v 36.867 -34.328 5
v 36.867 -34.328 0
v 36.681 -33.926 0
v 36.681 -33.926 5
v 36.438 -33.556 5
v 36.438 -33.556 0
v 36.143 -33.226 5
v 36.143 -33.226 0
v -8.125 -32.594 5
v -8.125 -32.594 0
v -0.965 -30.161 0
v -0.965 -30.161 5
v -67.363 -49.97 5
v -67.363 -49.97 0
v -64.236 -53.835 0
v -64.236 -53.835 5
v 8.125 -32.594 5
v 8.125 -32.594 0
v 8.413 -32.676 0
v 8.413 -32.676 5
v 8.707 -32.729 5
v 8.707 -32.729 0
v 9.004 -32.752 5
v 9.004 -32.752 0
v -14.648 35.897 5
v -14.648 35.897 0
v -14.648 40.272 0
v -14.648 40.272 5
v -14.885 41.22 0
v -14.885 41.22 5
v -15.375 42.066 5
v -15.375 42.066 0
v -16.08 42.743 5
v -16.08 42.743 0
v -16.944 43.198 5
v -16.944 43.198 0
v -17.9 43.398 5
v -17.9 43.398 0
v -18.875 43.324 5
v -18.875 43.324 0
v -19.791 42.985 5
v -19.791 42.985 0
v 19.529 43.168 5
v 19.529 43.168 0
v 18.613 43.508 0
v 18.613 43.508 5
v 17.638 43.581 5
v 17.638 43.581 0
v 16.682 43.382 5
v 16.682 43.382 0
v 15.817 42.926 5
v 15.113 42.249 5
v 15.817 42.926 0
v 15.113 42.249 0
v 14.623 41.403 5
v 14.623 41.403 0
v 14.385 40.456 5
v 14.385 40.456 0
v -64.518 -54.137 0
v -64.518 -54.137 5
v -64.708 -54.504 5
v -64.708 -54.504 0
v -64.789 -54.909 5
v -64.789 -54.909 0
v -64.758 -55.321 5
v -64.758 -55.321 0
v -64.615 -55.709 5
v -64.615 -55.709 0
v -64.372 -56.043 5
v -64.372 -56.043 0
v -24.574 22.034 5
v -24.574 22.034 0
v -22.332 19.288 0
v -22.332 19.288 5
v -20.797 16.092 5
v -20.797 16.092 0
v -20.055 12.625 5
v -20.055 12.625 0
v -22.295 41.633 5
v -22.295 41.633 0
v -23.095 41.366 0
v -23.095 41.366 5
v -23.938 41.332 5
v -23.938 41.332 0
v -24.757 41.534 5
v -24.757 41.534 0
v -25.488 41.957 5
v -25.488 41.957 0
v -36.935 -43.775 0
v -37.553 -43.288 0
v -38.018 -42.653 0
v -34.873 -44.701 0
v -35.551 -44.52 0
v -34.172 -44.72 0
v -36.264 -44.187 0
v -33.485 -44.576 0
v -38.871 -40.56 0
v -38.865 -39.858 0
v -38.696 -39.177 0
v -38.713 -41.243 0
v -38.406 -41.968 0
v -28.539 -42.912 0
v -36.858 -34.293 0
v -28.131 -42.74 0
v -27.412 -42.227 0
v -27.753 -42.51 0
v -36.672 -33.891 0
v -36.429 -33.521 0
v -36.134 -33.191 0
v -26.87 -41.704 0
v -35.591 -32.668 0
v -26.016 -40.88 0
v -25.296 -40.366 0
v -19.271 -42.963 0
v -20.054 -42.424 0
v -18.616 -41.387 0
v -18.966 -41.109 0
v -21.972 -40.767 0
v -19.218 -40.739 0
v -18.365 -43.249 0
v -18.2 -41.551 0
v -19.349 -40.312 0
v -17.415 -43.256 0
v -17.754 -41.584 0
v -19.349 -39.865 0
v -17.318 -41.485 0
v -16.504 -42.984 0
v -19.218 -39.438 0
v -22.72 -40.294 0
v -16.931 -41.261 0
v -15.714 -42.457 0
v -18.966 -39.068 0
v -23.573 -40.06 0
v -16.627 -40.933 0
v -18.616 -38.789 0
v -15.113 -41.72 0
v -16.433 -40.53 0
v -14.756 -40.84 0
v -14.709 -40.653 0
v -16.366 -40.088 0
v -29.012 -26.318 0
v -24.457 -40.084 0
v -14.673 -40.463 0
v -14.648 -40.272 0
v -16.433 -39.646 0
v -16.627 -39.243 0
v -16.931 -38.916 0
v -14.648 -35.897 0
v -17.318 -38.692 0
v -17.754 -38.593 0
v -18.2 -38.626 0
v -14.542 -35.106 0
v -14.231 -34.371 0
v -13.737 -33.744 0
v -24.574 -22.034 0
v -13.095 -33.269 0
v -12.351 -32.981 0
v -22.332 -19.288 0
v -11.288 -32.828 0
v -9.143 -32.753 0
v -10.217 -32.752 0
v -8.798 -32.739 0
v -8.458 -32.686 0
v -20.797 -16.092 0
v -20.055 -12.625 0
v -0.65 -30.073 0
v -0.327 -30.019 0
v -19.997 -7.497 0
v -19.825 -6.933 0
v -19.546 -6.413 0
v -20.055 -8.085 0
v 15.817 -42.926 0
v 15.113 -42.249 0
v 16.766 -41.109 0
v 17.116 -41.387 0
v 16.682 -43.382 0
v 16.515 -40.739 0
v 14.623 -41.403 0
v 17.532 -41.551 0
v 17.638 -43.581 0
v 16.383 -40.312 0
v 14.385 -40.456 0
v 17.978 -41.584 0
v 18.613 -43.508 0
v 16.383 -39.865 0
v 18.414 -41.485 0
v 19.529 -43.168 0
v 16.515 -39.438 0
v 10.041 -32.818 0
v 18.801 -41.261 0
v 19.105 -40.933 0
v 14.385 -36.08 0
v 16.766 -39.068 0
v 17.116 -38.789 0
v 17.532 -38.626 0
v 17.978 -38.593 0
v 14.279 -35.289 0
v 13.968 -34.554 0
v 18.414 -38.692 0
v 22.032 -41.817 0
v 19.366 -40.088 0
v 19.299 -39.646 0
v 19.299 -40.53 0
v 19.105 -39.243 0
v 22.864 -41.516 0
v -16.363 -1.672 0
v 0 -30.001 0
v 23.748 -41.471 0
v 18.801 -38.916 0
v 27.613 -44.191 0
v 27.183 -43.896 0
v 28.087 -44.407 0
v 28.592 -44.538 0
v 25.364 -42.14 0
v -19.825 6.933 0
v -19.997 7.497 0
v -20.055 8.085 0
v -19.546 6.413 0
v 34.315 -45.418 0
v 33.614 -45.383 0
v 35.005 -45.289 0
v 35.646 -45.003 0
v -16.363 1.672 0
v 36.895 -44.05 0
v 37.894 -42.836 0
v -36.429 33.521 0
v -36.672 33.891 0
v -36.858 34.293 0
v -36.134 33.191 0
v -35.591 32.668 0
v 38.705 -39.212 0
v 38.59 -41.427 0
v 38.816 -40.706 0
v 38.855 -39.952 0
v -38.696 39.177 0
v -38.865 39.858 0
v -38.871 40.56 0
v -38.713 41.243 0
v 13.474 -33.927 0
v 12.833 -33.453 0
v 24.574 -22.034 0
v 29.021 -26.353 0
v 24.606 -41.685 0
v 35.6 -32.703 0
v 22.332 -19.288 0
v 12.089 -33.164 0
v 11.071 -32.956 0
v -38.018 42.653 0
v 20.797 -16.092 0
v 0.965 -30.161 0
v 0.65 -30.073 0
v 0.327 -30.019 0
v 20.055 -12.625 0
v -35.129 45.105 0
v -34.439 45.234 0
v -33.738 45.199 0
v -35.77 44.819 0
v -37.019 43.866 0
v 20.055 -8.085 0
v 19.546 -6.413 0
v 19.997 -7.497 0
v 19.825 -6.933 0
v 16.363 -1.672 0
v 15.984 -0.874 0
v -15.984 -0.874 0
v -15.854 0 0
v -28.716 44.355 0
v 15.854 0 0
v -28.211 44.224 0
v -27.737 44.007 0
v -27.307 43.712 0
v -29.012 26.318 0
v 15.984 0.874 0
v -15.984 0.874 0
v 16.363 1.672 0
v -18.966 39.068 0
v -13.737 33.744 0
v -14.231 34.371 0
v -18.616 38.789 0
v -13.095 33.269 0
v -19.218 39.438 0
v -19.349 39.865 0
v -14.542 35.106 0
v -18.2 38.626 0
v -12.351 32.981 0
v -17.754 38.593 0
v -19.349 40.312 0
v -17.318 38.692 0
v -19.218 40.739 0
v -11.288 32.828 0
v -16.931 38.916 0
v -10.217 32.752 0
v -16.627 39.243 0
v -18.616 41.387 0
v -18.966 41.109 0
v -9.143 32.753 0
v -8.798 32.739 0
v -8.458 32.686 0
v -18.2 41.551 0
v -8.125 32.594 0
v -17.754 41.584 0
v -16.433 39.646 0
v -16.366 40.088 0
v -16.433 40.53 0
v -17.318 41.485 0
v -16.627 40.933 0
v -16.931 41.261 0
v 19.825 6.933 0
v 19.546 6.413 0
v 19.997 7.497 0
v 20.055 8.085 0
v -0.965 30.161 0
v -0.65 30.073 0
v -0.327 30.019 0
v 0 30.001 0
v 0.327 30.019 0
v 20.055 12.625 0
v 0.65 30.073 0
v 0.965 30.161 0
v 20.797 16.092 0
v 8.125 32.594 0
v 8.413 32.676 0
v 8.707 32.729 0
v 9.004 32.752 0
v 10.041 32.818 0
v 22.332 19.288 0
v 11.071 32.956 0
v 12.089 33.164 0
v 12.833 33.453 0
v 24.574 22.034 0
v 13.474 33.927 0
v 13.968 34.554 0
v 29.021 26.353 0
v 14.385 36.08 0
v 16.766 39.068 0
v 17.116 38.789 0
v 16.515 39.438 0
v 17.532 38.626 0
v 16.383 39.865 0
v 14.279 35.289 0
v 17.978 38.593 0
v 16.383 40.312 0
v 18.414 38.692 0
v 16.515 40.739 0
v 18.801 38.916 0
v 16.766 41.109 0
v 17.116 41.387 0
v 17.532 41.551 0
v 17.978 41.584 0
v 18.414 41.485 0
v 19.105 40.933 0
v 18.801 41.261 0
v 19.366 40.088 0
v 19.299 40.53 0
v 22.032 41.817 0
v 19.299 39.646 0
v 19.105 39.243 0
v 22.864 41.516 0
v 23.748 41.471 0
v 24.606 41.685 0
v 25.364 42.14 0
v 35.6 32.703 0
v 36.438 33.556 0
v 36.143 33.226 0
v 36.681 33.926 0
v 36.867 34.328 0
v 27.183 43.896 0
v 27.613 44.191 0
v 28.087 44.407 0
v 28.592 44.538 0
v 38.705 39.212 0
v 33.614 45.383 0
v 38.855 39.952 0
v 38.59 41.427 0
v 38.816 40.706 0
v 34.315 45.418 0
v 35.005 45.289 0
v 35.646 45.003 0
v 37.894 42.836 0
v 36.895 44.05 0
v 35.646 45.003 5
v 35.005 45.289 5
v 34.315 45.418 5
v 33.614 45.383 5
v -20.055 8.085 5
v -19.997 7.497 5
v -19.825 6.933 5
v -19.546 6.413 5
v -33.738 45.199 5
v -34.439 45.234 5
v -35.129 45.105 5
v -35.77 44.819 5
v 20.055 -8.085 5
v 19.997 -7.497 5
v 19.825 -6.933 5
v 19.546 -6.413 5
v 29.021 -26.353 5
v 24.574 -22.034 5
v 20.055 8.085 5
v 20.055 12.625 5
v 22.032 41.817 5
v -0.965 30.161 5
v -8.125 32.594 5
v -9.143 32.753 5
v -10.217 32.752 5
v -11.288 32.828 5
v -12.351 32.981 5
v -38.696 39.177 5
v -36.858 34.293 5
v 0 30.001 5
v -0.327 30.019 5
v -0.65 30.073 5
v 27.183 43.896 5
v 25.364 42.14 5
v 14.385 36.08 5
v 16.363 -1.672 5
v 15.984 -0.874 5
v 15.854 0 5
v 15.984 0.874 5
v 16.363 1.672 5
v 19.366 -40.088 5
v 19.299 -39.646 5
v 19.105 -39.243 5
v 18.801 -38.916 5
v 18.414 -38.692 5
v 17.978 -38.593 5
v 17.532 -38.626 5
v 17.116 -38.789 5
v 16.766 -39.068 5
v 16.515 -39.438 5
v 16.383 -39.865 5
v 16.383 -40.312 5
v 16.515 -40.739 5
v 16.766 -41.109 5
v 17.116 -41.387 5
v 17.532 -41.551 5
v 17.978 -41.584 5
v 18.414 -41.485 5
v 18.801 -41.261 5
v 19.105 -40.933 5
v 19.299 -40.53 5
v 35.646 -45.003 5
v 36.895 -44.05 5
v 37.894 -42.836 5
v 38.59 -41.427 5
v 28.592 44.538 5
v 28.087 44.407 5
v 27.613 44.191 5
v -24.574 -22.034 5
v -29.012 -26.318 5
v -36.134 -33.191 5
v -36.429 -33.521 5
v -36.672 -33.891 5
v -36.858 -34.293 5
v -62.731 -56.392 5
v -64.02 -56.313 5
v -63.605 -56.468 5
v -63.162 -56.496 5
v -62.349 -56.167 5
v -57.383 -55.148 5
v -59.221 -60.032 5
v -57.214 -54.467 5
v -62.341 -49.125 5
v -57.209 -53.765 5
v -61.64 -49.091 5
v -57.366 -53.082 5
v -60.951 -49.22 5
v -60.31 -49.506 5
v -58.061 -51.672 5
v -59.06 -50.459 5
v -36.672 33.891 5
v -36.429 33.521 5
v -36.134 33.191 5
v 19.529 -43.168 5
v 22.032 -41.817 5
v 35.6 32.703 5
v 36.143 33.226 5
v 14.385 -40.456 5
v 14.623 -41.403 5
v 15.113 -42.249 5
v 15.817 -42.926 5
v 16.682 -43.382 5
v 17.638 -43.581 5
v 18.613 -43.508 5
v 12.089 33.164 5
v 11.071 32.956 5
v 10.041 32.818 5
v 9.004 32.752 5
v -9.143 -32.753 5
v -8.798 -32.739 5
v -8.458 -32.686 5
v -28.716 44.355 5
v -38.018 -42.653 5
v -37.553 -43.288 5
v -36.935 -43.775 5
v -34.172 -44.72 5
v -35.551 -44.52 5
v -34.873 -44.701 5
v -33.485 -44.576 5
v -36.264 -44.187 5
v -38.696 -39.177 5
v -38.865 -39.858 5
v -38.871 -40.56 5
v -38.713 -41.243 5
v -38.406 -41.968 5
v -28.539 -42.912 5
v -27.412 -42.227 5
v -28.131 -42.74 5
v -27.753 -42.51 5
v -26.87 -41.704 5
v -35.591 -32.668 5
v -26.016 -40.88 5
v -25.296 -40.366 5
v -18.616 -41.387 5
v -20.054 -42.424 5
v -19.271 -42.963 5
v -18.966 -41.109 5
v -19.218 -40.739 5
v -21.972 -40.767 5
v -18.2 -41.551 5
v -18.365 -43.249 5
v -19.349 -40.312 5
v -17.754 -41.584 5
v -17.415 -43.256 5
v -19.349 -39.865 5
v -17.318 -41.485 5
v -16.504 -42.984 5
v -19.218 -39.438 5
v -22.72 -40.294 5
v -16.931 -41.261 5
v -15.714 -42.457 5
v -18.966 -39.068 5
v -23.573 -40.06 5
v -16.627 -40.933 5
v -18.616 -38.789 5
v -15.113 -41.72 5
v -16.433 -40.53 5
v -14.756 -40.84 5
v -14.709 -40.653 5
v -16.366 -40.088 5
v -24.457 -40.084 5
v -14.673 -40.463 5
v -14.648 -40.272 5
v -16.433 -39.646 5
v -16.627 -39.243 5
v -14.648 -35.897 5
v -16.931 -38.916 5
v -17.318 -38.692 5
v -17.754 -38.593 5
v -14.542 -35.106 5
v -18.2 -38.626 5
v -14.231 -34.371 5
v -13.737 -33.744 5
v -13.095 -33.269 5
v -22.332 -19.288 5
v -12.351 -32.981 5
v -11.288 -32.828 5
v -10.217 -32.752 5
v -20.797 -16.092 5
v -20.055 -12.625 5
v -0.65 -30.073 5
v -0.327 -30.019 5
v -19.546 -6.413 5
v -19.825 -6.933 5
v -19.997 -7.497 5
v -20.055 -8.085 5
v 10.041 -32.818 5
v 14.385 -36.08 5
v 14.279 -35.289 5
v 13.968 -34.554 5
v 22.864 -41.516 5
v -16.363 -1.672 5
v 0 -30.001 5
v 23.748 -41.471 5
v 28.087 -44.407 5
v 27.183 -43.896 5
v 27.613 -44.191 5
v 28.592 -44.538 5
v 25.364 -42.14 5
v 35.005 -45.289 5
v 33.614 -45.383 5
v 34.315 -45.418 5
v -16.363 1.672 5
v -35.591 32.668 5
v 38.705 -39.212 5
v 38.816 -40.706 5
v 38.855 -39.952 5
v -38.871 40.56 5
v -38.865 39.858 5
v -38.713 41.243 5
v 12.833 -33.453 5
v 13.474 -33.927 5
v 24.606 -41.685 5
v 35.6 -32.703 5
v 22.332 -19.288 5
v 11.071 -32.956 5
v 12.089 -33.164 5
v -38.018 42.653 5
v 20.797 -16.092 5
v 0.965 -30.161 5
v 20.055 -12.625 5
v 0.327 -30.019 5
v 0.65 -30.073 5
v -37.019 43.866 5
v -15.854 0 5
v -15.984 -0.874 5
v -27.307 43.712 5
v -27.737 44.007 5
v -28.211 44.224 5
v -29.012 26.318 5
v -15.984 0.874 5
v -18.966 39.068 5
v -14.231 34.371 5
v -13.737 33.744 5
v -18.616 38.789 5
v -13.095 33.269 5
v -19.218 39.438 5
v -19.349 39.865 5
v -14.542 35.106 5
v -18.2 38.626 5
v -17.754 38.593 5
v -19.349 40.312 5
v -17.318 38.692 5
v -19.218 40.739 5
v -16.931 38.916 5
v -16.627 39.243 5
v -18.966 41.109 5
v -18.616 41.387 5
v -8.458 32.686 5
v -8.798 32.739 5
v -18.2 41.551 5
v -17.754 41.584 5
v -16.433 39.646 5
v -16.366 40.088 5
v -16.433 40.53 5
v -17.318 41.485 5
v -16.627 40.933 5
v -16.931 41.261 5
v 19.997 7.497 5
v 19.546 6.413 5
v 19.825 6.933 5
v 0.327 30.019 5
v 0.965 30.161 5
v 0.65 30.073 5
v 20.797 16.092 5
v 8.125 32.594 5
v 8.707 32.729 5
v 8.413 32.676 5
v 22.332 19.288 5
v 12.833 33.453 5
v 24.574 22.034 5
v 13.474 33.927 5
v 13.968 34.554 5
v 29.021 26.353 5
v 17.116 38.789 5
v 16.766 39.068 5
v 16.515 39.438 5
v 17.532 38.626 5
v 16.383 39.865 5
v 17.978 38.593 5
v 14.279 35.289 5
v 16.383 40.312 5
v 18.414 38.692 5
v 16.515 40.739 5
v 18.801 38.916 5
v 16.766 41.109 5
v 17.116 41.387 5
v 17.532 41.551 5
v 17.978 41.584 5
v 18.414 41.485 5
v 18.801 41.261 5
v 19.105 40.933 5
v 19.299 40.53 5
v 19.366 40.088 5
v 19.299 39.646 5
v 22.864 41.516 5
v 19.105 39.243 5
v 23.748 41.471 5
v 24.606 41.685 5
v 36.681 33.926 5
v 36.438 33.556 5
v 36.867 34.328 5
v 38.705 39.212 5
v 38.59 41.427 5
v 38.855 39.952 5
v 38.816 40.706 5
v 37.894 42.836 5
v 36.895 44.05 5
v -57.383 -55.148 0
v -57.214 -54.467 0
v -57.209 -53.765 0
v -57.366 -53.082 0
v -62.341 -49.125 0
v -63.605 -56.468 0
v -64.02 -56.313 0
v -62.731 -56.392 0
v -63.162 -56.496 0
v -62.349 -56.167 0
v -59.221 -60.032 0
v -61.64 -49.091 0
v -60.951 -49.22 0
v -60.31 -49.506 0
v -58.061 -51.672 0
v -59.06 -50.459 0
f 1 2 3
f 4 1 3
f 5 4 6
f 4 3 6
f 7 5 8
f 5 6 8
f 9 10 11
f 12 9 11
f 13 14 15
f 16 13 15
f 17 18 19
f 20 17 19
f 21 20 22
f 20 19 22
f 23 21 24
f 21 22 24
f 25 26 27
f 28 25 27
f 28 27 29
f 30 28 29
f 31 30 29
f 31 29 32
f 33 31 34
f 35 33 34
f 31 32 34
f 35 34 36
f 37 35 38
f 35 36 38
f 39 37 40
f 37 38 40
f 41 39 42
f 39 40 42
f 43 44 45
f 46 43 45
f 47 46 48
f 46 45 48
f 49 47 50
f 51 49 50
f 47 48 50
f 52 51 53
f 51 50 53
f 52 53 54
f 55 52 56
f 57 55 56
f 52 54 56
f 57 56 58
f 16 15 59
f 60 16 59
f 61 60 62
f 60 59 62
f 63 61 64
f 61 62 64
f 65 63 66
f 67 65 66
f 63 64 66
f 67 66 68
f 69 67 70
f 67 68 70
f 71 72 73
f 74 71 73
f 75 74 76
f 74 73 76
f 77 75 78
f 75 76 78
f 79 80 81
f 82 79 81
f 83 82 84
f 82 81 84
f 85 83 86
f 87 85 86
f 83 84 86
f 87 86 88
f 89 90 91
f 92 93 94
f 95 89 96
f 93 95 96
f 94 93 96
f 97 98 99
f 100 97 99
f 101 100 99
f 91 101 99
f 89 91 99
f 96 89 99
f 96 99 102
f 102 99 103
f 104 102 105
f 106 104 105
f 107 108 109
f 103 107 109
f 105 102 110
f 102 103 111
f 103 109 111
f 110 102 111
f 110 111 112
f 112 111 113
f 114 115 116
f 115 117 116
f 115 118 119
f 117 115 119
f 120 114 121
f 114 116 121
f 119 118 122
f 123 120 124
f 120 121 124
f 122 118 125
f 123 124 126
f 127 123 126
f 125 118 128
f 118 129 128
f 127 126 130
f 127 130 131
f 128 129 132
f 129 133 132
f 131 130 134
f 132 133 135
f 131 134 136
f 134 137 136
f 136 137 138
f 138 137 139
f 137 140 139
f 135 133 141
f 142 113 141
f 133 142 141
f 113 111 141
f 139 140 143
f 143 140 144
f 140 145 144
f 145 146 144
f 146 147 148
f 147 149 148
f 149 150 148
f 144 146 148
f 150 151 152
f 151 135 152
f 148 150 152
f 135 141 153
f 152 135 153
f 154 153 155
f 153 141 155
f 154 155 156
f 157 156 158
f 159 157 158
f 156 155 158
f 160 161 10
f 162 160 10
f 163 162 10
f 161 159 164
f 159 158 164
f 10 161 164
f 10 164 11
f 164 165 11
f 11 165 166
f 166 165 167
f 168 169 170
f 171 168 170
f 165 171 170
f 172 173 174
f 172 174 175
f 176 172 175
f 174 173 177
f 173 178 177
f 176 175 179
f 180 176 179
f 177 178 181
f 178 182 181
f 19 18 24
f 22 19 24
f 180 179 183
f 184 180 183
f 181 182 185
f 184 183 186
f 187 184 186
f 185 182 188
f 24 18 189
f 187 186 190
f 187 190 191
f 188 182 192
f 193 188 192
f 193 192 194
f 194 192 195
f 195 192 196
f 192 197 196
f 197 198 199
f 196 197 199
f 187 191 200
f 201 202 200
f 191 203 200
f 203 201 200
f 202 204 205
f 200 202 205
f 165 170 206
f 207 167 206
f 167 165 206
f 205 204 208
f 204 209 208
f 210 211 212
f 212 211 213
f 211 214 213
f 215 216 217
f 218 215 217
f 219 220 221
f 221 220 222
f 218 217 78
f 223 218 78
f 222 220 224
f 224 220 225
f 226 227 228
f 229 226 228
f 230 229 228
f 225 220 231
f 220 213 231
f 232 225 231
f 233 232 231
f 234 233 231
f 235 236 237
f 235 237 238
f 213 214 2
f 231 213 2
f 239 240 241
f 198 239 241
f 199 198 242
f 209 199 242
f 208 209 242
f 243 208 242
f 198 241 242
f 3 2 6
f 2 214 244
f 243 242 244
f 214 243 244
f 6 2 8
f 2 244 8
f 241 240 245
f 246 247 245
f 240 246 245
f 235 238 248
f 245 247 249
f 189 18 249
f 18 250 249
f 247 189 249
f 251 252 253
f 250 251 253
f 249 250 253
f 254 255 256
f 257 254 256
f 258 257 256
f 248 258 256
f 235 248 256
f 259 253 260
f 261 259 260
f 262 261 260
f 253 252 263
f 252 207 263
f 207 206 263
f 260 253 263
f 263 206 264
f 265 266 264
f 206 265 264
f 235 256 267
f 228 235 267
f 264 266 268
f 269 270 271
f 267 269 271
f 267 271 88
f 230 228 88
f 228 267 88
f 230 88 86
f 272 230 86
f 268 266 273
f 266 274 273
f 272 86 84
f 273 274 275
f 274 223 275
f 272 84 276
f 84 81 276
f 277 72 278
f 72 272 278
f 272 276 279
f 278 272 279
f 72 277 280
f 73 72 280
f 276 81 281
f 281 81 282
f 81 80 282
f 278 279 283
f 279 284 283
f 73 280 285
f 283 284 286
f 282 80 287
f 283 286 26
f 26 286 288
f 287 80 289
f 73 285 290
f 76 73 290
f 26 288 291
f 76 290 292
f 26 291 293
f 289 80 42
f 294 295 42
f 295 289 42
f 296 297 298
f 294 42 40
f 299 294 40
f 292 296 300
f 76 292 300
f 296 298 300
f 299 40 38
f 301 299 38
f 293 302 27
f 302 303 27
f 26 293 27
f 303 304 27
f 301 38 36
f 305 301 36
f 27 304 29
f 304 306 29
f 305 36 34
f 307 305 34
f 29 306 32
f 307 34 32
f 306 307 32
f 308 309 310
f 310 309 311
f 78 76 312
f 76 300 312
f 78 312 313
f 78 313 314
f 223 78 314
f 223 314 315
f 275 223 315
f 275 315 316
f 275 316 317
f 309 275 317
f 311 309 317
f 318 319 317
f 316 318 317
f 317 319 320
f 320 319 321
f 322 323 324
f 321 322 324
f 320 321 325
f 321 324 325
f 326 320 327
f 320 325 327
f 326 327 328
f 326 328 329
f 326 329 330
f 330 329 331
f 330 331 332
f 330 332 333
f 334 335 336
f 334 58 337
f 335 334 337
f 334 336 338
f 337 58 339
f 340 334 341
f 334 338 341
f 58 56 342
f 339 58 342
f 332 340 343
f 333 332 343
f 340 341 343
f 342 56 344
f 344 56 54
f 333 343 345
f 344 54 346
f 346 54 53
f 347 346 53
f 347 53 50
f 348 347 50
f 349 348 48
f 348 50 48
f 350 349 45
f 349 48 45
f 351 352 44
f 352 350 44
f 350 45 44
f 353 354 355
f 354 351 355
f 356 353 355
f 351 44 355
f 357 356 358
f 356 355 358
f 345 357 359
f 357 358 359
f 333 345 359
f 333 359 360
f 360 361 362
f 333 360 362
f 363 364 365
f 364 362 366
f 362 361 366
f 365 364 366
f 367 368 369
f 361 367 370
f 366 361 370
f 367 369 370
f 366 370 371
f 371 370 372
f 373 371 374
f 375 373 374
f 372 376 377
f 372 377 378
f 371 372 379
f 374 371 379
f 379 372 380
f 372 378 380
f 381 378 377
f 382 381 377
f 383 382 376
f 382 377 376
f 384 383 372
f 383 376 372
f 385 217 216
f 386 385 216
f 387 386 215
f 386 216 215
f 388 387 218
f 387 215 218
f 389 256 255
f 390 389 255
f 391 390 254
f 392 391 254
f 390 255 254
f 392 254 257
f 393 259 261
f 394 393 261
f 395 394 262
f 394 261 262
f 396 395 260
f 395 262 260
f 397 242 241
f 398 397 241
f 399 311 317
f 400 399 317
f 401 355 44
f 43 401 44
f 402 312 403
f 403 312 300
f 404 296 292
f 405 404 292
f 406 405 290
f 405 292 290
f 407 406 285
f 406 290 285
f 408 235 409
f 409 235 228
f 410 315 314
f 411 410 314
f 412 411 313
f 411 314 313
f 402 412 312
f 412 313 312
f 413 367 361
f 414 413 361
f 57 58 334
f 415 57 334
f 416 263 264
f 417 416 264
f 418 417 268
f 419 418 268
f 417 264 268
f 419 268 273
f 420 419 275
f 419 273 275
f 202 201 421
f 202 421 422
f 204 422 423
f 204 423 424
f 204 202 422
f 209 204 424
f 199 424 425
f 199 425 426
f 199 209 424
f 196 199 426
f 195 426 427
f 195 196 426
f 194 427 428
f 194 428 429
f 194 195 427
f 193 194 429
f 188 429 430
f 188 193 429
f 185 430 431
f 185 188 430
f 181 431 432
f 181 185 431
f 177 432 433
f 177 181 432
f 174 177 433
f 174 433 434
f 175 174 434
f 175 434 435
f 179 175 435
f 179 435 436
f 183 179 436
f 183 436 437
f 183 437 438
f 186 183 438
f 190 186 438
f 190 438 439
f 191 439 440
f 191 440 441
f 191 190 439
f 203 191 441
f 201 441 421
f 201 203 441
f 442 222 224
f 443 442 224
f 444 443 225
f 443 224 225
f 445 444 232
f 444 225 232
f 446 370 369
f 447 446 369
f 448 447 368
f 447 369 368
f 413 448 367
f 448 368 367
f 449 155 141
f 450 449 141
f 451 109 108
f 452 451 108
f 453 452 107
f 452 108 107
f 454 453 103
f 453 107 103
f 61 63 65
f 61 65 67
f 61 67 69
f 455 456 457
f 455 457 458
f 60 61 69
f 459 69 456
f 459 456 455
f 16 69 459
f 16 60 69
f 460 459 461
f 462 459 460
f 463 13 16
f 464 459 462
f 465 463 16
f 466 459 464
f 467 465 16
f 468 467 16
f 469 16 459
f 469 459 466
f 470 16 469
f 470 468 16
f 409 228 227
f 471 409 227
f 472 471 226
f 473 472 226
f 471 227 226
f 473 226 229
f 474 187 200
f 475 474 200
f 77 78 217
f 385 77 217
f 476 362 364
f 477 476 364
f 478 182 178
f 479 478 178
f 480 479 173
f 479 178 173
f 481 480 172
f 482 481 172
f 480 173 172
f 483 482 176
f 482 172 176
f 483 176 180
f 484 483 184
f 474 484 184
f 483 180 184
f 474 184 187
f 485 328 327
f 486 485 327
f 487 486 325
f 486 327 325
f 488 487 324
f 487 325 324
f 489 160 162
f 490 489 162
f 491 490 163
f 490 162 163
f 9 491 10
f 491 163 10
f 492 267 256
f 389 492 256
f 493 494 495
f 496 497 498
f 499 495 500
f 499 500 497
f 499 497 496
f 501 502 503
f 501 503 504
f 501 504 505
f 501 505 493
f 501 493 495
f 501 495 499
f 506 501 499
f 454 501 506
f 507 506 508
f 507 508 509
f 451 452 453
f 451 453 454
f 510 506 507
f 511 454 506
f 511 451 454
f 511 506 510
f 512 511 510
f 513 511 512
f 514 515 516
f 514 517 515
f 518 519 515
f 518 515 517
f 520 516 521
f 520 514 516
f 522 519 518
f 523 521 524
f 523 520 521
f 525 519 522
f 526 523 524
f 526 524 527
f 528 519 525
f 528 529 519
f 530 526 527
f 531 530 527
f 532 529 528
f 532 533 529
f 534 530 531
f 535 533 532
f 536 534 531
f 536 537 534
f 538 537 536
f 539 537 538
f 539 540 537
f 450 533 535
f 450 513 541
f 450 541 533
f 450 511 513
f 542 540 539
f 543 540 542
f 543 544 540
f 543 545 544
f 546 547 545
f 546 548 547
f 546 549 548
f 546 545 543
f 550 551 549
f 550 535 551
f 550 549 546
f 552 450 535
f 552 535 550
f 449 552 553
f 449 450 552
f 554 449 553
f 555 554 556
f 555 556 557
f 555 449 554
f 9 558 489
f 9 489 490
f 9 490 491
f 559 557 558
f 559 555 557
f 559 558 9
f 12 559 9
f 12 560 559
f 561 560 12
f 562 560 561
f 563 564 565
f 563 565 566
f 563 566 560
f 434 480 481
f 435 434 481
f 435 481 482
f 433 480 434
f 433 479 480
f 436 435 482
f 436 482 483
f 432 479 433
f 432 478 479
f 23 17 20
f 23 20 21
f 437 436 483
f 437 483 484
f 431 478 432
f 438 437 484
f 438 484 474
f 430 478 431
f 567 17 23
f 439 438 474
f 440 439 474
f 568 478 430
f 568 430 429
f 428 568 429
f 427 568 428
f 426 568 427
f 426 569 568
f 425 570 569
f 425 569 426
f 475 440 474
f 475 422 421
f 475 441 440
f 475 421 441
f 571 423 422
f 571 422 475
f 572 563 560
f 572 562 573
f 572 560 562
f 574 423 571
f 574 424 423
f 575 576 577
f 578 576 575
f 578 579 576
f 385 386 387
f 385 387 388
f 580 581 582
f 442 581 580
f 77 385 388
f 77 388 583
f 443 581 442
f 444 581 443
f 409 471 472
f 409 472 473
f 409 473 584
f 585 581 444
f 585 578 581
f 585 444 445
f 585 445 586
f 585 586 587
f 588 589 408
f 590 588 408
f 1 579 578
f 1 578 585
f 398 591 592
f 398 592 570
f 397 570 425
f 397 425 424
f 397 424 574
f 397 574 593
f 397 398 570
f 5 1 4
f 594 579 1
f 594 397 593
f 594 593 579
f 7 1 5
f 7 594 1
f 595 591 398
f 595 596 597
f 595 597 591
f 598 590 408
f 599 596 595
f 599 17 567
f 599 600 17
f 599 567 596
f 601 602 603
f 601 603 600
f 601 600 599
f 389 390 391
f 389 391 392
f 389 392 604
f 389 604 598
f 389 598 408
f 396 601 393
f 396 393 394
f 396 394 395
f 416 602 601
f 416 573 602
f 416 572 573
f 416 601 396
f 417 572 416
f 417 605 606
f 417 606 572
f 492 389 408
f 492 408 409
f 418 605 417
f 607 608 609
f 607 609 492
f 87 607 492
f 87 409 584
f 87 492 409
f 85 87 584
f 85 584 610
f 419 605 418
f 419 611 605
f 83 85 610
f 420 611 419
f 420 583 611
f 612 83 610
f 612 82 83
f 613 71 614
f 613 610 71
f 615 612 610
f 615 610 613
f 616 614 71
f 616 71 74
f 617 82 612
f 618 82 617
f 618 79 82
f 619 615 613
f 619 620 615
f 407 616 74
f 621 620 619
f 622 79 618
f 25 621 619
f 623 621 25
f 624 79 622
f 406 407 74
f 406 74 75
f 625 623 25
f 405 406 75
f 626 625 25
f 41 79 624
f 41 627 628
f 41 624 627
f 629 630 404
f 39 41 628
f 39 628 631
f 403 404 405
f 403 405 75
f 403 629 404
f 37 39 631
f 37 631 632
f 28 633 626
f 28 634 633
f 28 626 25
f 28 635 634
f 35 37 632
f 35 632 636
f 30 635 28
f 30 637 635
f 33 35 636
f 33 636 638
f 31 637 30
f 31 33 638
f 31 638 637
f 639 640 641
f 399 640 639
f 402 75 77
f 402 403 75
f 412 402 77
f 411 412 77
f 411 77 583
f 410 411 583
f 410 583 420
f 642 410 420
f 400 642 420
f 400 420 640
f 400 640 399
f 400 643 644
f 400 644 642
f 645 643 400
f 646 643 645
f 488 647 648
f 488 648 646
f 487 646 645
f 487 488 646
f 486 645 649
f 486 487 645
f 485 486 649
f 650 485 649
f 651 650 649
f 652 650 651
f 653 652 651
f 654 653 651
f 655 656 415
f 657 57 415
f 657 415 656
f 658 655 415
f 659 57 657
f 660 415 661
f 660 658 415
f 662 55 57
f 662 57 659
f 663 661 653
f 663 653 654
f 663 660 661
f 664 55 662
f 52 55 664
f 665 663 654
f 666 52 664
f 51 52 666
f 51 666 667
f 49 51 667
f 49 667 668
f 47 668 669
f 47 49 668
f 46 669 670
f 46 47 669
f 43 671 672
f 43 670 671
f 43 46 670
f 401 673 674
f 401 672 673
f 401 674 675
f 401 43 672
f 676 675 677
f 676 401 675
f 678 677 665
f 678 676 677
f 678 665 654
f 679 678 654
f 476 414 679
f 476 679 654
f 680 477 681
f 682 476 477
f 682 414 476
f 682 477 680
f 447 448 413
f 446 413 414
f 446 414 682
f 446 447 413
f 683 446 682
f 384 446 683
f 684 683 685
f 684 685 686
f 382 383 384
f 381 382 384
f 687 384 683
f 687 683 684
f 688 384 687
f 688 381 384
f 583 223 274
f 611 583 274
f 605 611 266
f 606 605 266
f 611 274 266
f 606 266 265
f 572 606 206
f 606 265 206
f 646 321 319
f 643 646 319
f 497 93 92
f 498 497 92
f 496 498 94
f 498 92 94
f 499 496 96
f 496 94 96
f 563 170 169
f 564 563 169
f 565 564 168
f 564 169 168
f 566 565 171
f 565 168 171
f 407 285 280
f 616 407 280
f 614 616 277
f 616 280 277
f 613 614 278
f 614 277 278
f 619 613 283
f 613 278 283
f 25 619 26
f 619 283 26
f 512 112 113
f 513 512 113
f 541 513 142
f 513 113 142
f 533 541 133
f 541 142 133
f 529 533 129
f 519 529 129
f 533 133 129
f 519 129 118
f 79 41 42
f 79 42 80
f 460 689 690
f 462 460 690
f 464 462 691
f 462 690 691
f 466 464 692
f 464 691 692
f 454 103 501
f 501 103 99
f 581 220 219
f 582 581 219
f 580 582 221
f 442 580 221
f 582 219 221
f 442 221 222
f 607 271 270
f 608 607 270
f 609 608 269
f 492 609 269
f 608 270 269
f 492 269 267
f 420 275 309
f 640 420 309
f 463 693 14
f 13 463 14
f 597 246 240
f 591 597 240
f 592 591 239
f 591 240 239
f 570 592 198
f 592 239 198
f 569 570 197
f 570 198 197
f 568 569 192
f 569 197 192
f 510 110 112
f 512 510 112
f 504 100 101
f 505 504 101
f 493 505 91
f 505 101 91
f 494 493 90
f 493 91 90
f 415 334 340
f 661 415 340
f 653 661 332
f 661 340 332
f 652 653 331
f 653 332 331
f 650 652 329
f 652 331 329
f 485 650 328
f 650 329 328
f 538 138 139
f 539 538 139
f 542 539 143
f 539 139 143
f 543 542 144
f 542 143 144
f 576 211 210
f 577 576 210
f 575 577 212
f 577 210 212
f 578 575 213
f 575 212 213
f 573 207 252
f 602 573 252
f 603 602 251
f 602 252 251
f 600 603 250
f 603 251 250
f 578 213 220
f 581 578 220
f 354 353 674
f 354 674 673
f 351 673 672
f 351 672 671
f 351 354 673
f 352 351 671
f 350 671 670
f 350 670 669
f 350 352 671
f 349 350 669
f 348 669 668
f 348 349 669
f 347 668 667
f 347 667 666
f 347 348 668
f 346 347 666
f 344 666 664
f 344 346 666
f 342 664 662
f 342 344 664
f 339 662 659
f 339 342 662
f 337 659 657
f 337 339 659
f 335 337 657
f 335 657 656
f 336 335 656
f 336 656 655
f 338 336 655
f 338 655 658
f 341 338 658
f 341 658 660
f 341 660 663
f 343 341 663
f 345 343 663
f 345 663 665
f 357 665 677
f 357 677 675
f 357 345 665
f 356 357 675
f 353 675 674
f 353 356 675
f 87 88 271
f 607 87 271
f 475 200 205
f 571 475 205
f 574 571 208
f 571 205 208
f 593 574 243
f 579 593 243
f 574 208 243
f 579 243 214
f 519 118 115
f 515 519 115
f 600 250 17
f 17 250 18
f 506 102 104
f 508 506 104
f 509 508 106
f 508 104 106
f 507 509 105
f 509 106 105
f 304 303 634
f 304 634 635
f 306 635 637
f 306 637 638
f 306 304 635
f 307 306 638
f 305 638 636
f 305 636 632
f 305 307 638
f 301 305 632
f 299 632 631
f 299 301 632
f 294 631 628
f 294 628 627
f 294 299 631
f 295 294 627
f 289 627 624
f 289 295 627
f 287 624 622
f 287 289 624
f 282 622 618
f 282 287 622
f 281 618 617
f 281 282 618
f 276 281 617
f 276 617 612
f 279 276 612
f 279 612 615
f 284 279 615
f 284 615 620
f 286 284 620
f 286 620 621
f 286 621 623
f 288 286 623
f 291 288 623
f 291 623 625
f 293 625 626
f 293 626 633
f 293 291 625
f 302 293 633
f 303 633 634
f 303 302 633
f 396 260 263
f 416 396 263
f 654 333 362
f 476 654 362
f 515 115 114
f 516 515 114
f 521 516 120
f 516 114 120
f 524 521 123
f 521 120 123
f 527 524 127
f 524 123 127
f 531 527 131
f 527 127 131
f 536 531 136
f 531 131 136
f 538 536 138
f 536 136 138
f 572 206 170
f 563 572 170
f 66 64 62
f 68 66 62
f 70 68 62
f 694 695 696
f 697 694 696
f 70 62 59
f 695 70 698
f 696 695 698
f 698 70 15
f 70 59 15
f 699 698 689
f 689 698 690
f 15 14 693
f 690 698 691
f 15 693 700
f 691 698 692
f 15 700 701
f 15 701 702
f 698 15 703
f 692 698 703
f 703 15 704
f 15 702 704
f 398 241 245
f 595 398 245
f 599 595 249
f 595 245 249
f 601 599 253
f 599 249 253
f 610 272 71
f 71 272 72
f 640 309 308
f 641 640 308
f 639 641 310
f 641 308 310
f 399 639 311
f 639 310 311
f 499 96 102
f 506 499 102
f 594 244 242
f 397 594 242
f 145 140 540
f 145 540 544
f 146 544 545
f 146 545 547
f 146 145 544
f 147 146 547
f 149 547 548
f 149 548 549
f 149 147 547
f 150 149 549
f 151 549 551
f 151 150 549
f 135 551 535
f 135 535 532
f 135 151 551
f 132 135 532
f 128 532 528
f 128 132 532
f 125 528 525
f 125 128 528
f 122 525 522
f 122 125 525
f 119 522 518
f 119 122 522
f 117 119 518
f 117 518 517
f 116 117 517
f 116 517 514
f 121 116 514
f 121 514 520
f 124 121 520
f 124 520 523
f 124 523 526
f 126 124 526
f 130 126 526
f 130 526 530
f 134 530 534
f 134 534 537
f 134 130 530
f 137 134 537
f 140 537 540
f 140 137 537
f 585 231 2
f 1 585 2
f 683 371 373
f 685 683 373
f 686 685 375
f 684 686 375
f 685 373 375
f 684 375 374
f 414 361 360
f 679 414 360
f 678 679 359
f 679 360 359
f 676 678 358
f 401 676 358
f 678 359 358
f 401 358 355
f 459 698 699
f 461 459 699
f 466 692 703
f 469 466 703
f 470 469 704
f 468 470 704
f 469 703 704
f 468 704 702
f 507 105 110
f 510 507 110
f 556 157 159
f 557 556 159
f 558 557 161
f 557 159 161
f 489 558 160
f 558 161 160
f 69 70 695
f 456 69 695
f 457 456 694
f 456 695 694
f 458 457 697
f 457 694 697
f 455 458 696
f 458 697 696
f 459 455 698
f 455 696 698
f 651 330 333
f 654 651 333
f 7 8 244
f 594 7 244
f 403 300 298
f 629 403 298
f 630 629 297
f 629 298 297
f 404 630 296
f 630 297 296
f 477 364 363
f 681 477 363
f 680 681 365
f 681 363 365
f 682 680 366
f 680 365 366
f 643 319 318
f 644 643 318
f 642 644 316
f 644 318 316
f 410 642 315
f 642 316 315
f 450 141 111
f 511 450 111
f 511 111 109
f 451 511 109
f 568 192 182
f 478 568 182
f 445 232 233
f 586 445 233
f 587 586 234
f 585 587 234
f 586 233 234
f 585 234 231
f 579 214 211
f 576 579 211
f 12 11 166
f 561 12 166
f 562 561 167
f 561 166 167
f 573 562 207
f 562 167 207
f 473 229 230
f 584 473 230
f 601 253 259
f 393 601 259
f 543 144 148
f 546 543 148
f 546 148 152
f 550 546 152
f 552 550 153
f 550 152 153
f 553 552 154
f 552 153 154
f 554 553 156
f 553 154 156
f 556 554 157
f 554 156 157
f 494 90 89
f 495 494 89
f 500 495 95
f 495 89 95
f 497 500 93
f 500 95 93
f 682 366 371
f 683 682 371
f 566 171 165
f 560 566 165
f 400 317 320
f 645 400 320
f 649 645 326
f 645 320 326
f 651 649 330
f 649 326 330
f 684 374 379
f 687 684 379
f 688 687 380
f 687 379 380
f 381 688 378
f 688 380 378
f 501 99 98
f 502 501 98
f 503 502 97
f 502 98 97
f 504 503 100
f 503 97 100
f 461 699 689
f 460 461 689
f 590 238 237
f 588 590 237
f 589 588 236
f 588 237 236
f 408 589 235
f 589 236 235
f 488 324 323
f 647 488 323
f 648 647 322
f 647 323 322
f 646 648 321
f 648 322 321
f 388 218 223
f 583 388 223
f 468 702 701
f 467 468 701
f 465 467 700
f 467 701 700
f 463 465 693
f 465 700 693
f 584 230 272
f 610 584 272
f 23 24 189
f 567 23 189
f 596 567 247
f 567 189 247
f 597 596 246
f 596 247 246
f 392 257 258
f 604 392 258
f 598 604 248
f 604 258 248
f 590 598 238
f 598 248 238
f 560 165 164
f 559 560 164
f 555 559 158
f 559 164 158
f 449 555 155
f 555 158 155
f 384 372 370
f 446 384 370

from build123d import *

# Parameters (mm, degrees)
F0_R     = 1.5
F1_DEPTH = 5


with BuildPart() as f1:
    # F0 (on Top) → F1 (new body)
    with BuildSketch(Plane.XY):
        with BuildLine():
            ThreePointArc((28.5921836631, 44.5382779555), (27.8455318059, 44.3096061199), (27.18318982, 43.8959844353))
            Line((27.18318982, 43.8959844353), (25.36414196, 42.1403102047))
            ThreePointArc((25.36414196, 42.1403102047), (23.7475314323, 41.4705011282), (22.0322211549, 41.8166000296))
            Line((22.0322211549, 41.8166000296), (19.5288235349, 43.1681490616))
            ThreePointArc((19.5288235349, 43.1681490616), (16.2333532615, 43.1841726269), (14.3853910977, 40.4555434988))
            Line((14.3853910977, 40.4555434988), (14.3853910977, 36.0804238247))
            ThreePointArc((14.3853910977, 36.0804238247), (13.7422335304, 34.2242735755), (12.0885285994, 33.1639880455))
            ThreePointArc((12.0885285994, 33.1639880455), (10.5570993875, 32.8779888748), (9.004266017, 32.7523724736))
            ThreePointArc((9.004266017, 32.7523724736), (8.5588712997, 32.7061238162), (8.125322134, 32.5940947422))
            Line((8.125322134, 32.5940947422), (0.9652288681, 30.1610109355))
            ThreePointArc((0.9652288681, 30.1610109355), (0.4891607679, 30.0416404555), (0, 30.0014920975))
            ThreePointArc((0, 30.0014920975), (-0.4891607679, 30.0416404555), (-0.9652288681, 30.1610109355))
            Line((-0.9652288681, 30.1610109355), (-8.125322134, 32.5940947422))
            ThreePointArc((-8.125322134, 32.5940947422), (-8.6272095116, 32.7173849963), (-9.1428099079, 32.7527071954))
            ThreePointArc((-9.1428099079, 32.7527071954), (-10.7529566618, 32.7804199642), (-12.3508532478, 32.9805875619))
            ThreePointArc((-12.3508532478, 32.9805875619), (-14.0045581788, 34.0408730919), (-14.6477157461, 35.8970233411))
            Line((-14.6477157461, 35.8970233411), (-14.6477157461, 40.2721430152))
            ThreePointArc((-14.6477157461, 40.2721430152), (-16.4956779099, 43.0007721433), (-19.7911481833, 42.984748578))
            Line((-19.7911481833, 42.984748578), (-22.2945458033, 41.633199546))
            ThreePointArc((-22.2945458033, 41.633199546), (-23.9381180371, 41.3319035535), (-25.4879227175, 41.9565749993))
            Line((-25.4879227175, 41.9565749993), (-27.3069705775, 43.7122492299))
            ThreePointArc((-27.3069705775, 43.7122492299), (-27.9693125633, 44.1258709145), (-28.7159644205, 44.3545427501))
            Line((-28.7159644205, 44.3545427501), (-33.7380945968, 45.199445495))
            ThreePointArc((-33.7380945968, 45.199445495), (-34.7875797232, 45.1898414822), (-35.7695334382, 44.819330795))
            ThreePointArc((-35.7695334382, 44.819330795), (-37.5533448102, 43.288139802), (-38.7133397674, 41.2434049616))
            ThreePointArc((-38.7133397674, 41.2434049616), (-38.8883124755, 40.2085639984), (-38.6961274951, 39.1767809781))
            Line((-38.6961274951, 39.1767809781), (-36.8579549956, 34.2929692104))
            ThreePointArc((-36.8579549956, 34.2929692104), (-36.5570763842, 33.7017715683), (-36.1336296608, 33.1911489451))
            Line((-36.1336296608, 33.1911489451), (-35.5914095939, 32.6678192297))
            Line((-35.5914095939, 32.6678192297), (-29.0124277762, 26.3180419121))
            Line((-29.0124277762, 26.3180419121), (-24.5740902909, 22.0343312296))
            ThreePointArc((-24.5740902909, 22.0343312296), (-21.469677626, 17.735489268), (-20.0549770624, 12.6251035174))
            Line((-20.0549770624, 12.6251035174), (-20.0549770624, 8.0847151044))
            ThreePointArc((-20.0549770624, 8.0847151044), (-19.9248548926, 7.2107578743), (-19.5457762357, 6.412614785))
            Line((-19.5457762357, 6.412614785), (-16.3634178036, 1.6721003194))
            ThreePointArc((-16.3634178036, 1.6721003194), (-15.8542169769, 0), (-16.3634178036, -1.6721003194))
            Line((-16.3634178036, -1.6721003194), (-19.5457762357, -6.412614785))
            ThreePointArc((-19.5457762357, -6.412614785), (-19.9248548926, -7.2107578743), (-20.0549770624, -8.0847151044))
            Line((-20.0549770624, -8.0847151044), (-20.0549770624, -12.6251035174))
            ThreePointArc((-20.0549770624, -12.6251035174), (-21.469677626, -17.735489268), (-24.5740902909, -22.0343312296))
            Line((-24.5740902909, -22.0343312296), (-29.0124277762, -26.3180419121))
            Line((-29.0124277762, -26.3180419121), (-35.5914095939, -32.6678192297))
            Line((-35.5914095939, -32.6678192297), (-36.1336296608, -33.1911489451))
            ThreePointArc((-36.1336296608, -33.1911489451), (-36.5570763842, -33.7017715683), (-36.8579549956, -34.2929692104))
            Line((-36.8579549956, -34.2929692104), (-38.6961274951, -39.1767809781))
            ThreePointArc((-38.6961274951, -39.1767809781), (-38.8883124755, -40.2085639984), (-38.7133397674, -41.2434049616))
            ThreePointArc((-38.7133397674, -41.2434049616), (-38.2218494121, -42.3159832036), (-37.5533448102, -43.288139802))
            ThreePointArc((-37.5533448102, -43.288139802), (-36.6054945104, -43.9906827997), (-35.5510113307, -44.5198822689))
            ThreePointArc((-35.5510113307, -44.5198822689), (-34.5230226232, -44.7314253731), (-33.4850758878, -44.5759331154))
            Line((-33.4850758878, -44.5759331154), (-28.5391782864, -42.9120243328))
            ThreePointArc((-28.5391782864, -42.9120243328), (-27.9376873831, -42.632290023), (-27.4123763915, -42.2272086078))
            Line((-27.4123763915, -42.2272086078), (-26.8701563245, -41.7038788924))
            Line((-26.8701563245, -41.7038788924), (-26.0160654742, -40.8795436292))
            ThreePointArc((-26.0160654742, -40.8795436292), (-24.0158410052, -40.0392849725), (-21.9721238673, -40.7674008953))
            Line((-21.9721238673, -40.7674008953), (-20.053753454, -42.4237275088))
            ThreePointArc((-20.053753454, -42.4237275088), (-16.9494483318, -43.1542429501), (-14.7555353203, -40.8397000581))
            ThreePointArc((-14.7555353203, -40.8397000581), (-14.6898954535, -40.5581499156), (-14.6477157461, -40.2721430152))
            Line((-14.6477157461, -40.2721430152), (-14.6477157461, -35.8970233411))
            ThreePointArc((-14.6477157461, -35.8970233411), (-14.0045581788, -34.0408730919), (-12.3508532478, -32.9805875619))
            ThreePointArc((-12.3508532478, -32.9805875619), (-10.7529566618, -32.7804199642), (-9.1428099079, -32.7527071954))
            ThreePointArc((-9.1428099079, -32.7527071954), (-8.6272095116, -32.7173849963), (-8.125322134, -32.5940947422))
            Line((-8.125322134, -32.5940947422), (-0.9652288681, -30.1610109355))
            ThreePointArc((-0.9652288681, -30.1610109355), (-0.4891607679, -30.0416404555), (0, -30.0014920975))
            ThreePointArc((0, -30.0014920975), (0.4891607679, -30.0416404555), (0.9652288681, -30.1610109355))
            Line((0.9652288681, -30.1610109355), (8.125322134, -32.5940947422))
            ThreePointArc((8.125322134, -32.5940947422), (8.5588712997, -32.7061238162), (9.004266017, -32.7523724736))
            ThreePointArc((9.004266017, -32.7523724736), (10.5570993875, -32.8779888748), (12.0885285994, -33.1639880455))
            ThreePointArc((12.0885285994, -33.1639880455), (13.7422335304, -34.2242735755), (14.3853910977, -36.0804238247))
            Line((14.3853910977, -36.0804238247), (14.3853910977, -40.4555434988))
            ThreePointArc((14.3853910977, -40.4555434988), (16.2333532615, -43.1841726269), (19.5288235349, -43.1681490616))
            Line((19.5288235349, -43.1681490616), (22.0322211549, -41.8166000296))
            ThreePointArc((22.0322211549, -41.8166000296), (23.7475314323, -41.4705011282), (25.36414196, -42.1403102047))
            Line((25.36414196, -42.1403102047), (27.18318982, -43.8959844353))
            ThreePointArc((27.18318982, -43.8959844353), (27.8455318059, -44.3096061199), (28.5921836631, -44.5382779555))
            Line((28.5921836631, -44.5382779555), (33.6143138393, -45.3831807004))
            ThreePointArc((33.6143138393, -45.3831807004), (34.6637989657, -45.3735766876), (35.6457526807, -45.0030660004))
            ThreePointArc((35.6457526807, -45.0030660004), (37.4295640528, -43.4718750074), (38.58955901, -41.427140167))
            ThreePointArc((38.58955901, -41.427140167), (38.8596560565, -40.3304581985), (38.705109006, -39.2116289157))
            Line((38.705109006, -39.2116289157), (36.8669365064, -34.327817148))
            ThreePointArc((36.8669365064, -34.327817148), (36.566057895, -33.7366195059), (36.1426111717, -33.2259968827))
            Line((36.1426111717, -33.2259968827), (35.6003911047, -32.7026671673))
            Line((35.6003911047, -32.7026671673), (29.021409287, -26.3528898497))
            Line((29.021409287, -26.3528898497), (24.5740902909, -22.0343312296))
            ThreePointArc((24.5740902909, -22.0343312296), (21.469677626, -17.735489268), (20.0549770624, -12.6251035174))
            Line((20.0549770624, -12.6251035174), (20.0549770624, -8.0847151044))
            ThreePointArc((20.0549770624, -8.0847151044), (19.9248548926, -7.2107578743), (19.5457762357, -6.412614785))
            Line((19.5457762357, -6.412614785), (16.3634178036, -1.6721003194))
            ThreePointArc((16.3634178036, -1.6721003194), (15.8542169769, 0), (16.3634178036, 1.6721003194))
            Line((16.3634178036, 1.6721003194), (19.5457762357, 6.412614785))
            ThreePointArc((19.5457762357, 6.412614785), (19.9248548926, 7.2107578743), (20.0549770624, 8.0847151044))
            Line((20.0549770624, 8.0847151044), (20.0549770624, 12.6251035174))
            ThreePointArc((20.0549770624, 12.6251035174), (21.469677626, 17.735489268), (24.5740902909, 22.0343312296))
            Line((24.5740902909, 22.0343312296), (29.021409287, 26.3528898497))
            Line((29.021409287, 26.3528898497), (35.6003911047, 32.7026671673))
            Line((35.6003911047, 32.7026671673), (36.1426111717, 33.2259968827))
            ThreePointArc((36.1426111717, 33.2259968827), (36.566057895, 33.7366195059), (36.8669365064, 34.327817148))
            Line((36.8669365064, 34.327817148), (38.705109006, 39.2116289157))
            ThreePointArc((38.705109006, 39.2116289157), (38.8596560565, 40.3304581985), (38.58955901, 41.427140167))
            ThreePointArc((38.58955901, 41.427140167), (37.4295640528, 43.4718750074), (35.6457526807, 45.0030660004))
            ThreePointArc((35.6457526807, 45.0030660004), (34.6637989657, 45.3735766876), (33.6143138393, 45.3831807004))
            Line((33.6143138393, 45.3831807004), (28.5921836631, 44.5382779555))
        make_face()
        with Locations((-17.8660744539, -40.0883332402)):
            Circle(F0_R, mode=Mode.SUBTRACT)
        with Locations((17.8660744539, -40.0883332402)):
            Circle(F0_R, mode=Mode.SUBTRACT)
        with Locations((-17.8660744539, 40.0883332402)):
            Circle(F0_R, mode=Mode.SUBTRACT)
        with Locations((17.8660744539, 40.0883332402)):
            Circle(F0_R, mode=Mode.SUBTRACT)
    extrude(amount=F1_DEPTH)


with BuildPart() as f1b:
    # F0 (on Top) → F1, piece 2 (new body)
    with BuildSketch(Plane.XY):
        with BuildLine():
            ThreePointArc((-60.3096856504, -49.5056065138), (-61.2916393654, -49.1350958266), (-62.3411244918, -49.1254918138))
            Line((-62.3411244918, -49.1254918138), (-67.3632546681, -49.9703945587))
            Line((-67.3632546681, -49.9703945587), (-64.2358401806, -53.8351387591))
            ThreePointArc((-64.2358401806, -53.8351387591), (-62.646260619, -53.6474141403), (-61.7922593806, -55.0011813286))
            ThreePointArc((-61.7922593806, -55.0011813286), (-61.9384921923, -55.6471800901), (-62.3486785805, -56.167223898))
            Line((-62.3486785805, -56.167223898), (-59.2212640931, -60.0319680984))
            Line((-59.2212640931, -60.0319680984), (-57.3830915935, -55.1481563307))
            ThreePointArc((-57.3830915935, -55.1481563307), (-57.1909066131, -54.1163733104), (-57.3658793212, -53.0815323472))
            ThreePointArc((-57.3658793212, -53.0815323472), (-58.5258742784, -51.0367975068), (-60.3096856504, -49.5056065138))
        make_face()
        with BuildLine():
            ThreePointArc((-61.7922593806, -55.0011813286), (-62.646260619, -53.6474141403), (-64.2358401806, -53.8351387591))
            Line((-64.2358401806, -53.8351387591), (-63.2922593806, -55.0011813286))
            Line((-63.2922593806, -55.0011813286), (-62.3486785805, -56.167223898))
            ThreePointArc((-62.3486785805, -56.167223898), (-61.9384921923, -55.6471800901), (-61.7922593806, -55.0011813286))
        make_face()
        with BuildLine():
            Line((-63.2922593806, -55.0011813286), (-64.2358401806, -53.8351387591))
            ThreePointArc((-64.2358401806, -53.8351387591), (-64.7894333017, -54.909147368), (-64.3715536264, -56.0428741484))
            Line((-64.3715536264, -56.0428741484), (-63.2922593806, -55.0011813286))
        make_face()
        with BuildLine():
            Line((-62.3486785805, -56.167223898), (-63.2922593806, -55.0011813286))
            Line((-63.2922593806, -55.0011813286), (-64.3715536264, -56.0428741484))
            ThreePointArc((-64.3715536264, -56.0428741484), (-63.3842933411, -56.4983552497), (-62.3486785805, -56.167223898))
        make_face()
    extrude(amount=F1_DEPTH)


solid = Compound([f1.part, f1b.part])
